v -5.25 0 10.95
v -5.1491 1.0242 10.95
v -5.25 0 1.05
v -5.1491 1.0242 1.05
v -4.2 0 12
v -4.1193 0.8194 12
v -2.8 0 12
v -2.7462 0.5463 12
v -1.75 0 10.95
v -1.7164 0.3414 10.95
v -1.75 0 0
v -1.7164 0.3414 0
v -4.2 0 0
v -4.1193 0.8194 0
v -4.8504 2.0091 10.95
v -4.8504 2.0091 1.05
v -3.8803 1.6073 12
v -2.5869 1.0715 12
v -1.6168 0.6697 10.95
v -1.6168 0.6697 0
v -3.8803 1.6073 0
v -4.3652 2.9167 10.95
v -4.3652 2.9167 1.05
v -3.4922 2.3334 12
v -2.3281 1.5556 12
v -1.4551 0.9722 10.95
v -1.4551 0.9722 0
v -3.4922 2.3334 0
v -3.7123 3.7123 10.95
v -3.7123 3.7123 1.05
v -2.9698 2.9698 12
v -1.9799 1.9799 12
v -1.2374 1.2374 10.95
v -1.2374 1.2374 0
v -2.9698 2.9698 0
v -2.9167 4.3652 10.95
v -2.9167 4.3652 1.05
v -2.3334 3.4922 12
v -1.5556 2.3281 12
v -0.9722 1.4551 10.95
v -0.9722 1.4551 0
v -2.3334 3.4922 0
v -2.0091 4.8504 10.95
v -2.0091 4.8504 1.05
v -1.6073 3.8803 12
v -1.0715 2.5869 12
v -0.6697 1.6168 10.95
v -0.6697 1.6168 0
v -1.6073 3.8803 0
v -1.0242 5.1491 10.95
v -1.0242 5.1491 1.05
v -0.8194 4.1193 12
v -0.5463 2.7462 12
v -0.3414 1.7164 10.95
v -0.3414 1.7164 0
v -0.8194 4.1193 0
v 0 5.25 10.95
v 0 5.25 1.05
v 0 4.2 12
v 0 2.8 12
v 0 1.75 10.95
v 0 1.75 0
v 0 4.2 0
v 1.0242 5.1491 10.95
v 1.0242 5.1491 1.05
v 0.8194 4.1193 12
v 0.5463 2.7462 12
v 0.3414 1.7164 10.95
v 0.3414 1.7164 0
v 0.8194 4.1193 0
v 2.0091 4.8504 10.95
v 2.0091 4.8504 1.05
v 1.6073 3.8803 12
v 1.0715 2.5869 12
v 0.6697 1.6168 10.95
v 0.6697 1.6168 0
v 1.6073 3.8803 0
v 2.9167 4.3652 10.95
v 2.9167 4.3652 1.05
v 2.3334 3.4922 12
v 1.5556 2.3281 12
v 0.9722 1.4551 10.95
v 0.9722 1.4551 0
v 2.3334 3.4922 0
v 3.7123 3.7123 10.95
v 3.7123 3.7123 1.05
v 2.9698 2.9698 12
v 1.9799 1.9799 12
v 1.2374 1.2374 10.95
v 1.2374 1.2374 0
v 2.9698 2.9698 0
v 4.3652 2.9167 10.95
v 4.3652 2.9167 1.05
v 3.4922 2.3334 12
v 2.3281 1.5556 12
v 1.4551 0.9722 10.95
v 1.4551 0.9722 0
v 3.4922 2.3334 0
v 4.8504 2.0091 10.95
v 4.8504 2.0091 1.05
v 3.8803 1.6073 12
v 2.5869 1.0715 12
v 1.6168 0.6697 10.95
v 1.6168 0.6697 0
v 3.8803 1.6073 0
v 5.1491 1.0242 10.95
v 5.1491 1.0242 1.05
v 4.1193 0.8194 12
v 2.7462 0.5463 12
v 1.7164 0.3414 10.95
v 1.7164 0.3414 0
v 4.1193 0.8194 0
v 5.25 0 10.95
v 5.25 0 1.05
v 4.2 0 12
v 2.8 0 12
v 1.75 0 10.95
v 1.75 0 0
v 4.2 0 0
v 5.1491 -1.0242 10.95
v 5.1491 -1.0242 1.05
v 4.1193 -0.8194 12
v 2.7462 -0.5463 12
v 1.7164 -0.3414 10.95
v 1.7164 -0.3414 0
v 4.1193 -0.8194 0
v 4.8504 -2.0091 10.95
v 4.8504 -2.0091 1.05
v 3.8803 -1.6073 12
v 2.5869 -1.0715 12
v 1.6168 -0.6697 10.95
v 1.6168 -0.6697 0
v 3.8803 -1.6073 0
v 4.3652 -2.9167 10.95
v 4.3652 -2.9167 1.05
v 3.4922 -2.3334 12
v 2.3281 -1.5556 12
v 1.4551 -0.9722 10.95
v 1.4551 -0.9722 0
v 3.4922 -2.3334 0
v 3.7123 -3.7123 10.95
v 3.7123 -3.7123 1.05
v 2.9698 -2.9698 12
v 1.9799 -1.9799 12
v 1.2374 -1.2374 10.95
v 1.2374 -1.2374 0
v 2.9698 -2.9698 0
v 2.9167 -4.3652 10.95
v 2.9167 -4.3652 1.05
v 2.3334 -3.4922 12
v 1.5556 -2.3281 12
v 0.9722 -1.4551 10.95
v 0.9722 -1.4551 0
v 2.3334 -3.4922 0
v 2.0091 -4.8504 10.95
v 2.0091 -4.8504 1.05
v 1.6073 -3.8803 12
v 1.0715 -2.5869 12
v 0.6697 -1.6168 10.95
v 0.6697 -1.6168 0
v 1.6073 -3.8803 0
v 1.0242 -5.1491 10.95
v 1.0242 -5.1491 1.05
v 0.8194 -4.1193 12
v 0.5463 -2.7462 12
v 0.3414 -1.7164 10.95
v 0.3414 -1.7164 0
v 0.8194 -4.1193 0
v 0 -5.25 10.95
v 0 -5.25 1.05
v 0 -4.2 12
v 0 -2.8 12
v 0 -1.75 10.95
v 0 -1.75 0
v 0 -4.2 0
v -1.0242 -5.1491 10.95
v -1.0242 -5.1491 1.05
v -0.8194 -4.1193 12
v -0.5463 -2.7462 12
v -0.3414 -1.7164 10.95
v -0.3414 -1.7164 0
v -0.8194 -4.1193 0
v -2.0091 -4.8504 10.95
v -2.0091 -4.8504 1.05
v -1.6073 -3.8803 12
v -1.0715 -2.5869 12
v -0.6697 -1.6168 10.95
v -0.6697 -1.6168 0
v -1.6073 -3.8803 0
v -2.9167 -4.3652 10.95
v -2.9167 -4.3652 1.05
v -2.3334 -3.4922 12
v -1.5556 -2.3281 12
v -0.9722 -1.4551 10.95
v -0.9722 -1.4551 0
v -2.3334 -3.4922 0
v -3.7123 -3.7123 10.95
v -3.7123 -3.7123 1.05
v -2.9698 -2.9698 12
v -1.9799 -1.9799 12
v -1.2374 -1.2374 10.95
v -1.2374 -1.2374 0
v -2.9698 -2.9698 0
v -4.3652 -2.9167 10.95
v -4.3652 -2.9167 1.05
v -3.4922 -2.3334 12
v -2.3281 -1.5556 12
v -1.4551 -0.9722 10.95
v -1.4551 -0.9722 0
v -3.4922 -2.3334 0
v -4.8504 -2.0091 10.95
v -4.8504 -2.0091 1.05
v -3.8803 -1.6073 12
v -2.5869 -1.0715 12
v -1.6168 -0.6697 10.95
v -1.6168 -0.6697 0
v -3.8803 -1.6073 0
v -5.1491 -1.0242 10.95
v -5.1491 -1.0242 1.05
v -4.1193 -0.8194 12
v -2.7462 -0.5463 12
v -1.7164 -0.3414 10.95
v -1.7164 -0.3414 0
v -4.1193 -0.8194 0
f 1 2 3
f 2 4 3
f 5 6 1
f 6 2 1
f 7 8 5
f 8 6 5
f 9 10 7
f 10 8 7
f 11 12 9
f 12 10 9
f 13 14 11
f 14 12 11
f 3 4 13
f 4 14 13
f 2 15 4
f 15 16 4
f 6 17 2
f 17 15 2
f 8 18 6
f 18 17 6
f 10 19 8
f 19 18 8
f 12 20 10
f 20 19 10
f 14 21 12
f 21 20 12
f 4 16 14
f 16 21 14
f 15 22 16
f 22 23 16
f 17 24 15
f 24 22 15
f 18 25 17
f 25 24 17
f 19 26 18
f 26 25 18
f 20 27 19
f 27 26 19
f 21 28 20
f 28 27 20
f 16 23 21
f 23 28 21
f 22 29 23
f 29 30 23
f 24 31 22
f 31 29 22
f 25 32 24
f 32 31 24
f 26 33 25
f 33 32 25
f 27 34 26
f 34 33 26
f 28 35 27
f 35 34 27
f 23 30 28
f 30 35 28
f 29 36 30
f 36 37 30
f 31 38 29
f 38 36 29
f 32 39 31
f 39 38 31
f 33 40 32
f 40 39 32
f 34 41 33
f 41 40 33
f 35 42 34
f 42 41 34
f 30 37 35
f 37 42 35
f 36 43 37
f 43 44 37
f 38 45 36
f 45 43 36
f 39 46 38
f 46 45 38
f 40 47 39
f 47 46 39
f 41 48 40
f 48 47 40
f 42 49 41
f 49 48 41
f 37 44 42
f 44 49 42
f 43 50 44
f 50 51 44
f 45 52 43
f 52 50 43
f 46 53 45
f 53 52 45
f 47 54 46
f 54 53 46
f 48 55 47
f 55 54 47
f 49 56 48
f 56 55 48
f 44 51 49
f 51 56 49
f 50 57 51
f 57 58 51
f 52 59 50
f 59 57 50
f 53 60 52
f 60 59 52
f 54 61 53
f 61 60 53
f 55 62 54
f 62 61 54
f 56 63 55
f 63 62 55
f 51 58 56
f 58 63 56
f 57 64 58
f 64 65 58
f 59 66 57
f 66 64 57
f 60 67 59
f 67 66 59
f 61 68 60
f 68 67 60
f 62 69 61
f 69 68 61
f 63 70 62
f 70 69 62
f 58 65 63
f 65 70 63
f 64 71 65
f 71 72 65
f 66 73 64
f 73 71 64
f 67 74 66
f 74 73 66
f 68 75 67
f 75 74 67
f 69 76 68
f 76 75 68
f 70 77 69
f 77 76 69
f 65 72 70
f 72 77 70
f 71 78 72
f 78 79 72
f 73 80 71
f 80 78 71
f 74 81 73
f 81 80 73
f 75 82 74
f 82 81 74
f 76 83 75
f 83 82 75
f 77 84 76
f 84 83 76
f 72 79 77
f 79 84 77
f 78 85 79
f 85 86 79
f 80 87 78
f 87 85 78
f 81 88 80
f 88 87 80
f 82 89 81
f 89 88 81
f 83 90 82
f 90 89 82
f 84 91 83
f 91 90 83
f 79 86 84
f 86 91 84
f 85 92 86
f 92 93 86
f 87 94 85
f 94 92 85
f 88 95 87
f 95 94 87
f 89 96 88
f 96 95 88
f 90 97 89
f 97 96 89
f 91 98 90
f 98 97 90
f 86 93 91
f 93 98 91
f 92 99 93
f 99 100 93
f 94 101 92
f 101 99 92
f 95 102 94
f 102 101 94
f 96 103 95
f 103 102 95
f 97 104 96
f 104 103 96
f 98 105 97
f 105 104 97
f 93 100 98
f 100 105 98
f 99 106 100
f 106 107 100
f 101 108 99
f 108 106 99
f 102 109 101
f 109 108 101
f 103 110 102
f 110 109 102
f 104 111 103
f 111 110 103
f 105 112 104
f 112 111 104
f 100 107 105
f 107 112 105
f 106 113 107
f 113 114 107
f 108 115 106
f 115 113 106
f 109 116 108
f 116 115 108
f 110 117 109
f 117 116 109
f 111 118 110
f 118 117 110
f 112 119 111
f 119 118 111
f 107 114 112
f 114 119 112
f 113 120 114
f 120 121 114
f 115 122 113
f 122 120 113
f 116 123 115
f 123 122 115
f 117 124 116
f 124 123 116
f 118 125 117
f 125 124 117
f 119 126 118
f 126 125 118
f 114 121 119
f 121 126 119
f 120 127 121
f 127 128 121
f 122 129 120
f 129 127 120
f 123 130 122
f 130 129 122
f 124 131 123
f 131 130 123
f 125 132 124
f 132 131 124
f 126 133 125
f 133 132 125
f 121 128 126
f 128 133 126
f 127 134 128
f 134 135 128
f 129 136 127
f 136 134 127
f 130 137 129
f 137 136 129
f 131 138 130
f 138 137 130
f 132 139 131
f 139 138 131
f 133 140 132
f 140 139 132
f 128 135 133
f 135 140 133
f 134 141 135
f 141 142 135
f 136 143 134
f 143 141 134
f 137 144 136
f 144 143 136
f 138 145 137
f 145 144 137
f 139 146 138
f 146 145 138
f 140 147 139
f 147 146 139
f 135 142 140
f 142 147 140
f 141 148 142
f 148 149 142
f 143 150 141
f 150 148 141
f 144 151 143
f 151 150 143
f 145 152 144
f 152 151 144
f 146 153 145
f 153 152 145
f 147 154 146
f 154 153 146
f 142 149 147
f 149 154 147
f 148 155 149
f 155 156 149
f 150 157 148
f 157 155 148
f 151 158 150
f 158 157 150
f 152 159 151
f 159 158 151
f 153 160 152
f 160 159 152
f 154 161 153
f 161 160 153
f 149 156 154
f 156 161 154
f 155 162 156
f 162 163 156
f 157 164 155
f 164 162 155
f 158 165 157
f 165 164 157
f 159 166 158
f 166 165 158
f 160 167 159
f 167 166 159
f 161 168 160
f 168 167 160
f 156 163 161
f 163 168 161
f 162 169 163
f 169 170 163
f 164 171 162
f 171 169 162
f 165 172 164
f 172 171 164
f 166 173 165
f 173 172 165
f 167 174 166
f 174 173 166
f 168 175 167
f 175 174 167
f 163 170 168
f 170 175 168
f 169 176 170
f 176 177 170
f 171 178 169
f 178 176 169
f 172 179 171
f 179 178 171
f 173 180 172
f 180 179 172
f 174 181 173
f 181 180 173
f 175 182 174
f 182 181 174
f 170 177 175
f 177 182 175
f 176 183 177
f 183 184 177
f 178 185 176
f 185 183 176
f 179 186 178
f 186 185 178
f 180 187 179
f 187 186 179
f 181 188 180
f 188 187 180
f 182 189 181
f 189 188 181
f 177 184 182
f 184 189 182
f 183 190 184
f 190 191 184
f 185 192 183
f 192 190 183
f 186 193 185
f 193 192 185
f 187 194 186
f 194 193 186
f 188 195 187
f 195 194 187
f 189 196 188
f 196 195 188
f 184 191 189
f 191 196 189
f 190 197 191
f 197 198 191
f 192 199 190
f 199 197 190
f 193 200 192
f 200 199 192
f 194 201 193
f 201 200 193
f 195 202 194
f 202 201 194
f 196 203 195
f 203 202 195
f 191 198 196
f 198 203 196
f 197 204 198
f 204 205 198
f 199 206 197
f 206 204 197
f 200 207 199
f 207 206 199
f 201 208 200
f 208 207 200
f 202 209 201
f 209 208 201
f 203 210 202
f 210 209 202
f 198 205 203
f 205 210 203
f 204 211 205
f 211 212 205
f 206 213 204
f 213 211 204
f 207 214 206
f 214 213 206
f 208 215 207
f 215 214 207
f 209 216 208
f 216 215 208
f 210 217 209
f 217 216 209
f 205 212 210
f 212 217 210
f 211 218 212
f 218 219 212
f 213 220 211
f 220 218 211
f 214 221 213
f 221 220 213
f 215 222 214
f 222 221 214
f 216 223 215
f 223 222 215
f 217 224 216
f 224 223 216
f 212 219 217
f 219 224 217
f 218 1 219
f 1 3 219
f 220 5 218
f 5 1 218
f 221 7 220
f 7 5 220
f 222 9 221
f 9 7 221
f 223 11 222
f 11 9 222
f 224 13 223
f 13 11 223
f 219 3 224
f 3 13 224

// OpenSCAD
$fn = 32;

// ----------------------------------------------------------------------
// Form washer: chamfered washer, 10.5 mm outside, 3.5 mm bore
// ----------------------------------------------------------------------

// --- parameters (mm) ---
revolve_angle = 360;      // full turn around the Z axis
profile_points = 7;       // points of the closed outline

profile = [[1.75, 0], [4.2, 0], [5.25, 1.05], [5.25, 10.95], [4.2, 12], [2.8, 12], [1.75, 10.95]];  // single closed polygon, 7 points, counter clockwise

// --- the one profile operation ---
rotate_extrude(angle = revolve_angle) polygon(points = profile);
